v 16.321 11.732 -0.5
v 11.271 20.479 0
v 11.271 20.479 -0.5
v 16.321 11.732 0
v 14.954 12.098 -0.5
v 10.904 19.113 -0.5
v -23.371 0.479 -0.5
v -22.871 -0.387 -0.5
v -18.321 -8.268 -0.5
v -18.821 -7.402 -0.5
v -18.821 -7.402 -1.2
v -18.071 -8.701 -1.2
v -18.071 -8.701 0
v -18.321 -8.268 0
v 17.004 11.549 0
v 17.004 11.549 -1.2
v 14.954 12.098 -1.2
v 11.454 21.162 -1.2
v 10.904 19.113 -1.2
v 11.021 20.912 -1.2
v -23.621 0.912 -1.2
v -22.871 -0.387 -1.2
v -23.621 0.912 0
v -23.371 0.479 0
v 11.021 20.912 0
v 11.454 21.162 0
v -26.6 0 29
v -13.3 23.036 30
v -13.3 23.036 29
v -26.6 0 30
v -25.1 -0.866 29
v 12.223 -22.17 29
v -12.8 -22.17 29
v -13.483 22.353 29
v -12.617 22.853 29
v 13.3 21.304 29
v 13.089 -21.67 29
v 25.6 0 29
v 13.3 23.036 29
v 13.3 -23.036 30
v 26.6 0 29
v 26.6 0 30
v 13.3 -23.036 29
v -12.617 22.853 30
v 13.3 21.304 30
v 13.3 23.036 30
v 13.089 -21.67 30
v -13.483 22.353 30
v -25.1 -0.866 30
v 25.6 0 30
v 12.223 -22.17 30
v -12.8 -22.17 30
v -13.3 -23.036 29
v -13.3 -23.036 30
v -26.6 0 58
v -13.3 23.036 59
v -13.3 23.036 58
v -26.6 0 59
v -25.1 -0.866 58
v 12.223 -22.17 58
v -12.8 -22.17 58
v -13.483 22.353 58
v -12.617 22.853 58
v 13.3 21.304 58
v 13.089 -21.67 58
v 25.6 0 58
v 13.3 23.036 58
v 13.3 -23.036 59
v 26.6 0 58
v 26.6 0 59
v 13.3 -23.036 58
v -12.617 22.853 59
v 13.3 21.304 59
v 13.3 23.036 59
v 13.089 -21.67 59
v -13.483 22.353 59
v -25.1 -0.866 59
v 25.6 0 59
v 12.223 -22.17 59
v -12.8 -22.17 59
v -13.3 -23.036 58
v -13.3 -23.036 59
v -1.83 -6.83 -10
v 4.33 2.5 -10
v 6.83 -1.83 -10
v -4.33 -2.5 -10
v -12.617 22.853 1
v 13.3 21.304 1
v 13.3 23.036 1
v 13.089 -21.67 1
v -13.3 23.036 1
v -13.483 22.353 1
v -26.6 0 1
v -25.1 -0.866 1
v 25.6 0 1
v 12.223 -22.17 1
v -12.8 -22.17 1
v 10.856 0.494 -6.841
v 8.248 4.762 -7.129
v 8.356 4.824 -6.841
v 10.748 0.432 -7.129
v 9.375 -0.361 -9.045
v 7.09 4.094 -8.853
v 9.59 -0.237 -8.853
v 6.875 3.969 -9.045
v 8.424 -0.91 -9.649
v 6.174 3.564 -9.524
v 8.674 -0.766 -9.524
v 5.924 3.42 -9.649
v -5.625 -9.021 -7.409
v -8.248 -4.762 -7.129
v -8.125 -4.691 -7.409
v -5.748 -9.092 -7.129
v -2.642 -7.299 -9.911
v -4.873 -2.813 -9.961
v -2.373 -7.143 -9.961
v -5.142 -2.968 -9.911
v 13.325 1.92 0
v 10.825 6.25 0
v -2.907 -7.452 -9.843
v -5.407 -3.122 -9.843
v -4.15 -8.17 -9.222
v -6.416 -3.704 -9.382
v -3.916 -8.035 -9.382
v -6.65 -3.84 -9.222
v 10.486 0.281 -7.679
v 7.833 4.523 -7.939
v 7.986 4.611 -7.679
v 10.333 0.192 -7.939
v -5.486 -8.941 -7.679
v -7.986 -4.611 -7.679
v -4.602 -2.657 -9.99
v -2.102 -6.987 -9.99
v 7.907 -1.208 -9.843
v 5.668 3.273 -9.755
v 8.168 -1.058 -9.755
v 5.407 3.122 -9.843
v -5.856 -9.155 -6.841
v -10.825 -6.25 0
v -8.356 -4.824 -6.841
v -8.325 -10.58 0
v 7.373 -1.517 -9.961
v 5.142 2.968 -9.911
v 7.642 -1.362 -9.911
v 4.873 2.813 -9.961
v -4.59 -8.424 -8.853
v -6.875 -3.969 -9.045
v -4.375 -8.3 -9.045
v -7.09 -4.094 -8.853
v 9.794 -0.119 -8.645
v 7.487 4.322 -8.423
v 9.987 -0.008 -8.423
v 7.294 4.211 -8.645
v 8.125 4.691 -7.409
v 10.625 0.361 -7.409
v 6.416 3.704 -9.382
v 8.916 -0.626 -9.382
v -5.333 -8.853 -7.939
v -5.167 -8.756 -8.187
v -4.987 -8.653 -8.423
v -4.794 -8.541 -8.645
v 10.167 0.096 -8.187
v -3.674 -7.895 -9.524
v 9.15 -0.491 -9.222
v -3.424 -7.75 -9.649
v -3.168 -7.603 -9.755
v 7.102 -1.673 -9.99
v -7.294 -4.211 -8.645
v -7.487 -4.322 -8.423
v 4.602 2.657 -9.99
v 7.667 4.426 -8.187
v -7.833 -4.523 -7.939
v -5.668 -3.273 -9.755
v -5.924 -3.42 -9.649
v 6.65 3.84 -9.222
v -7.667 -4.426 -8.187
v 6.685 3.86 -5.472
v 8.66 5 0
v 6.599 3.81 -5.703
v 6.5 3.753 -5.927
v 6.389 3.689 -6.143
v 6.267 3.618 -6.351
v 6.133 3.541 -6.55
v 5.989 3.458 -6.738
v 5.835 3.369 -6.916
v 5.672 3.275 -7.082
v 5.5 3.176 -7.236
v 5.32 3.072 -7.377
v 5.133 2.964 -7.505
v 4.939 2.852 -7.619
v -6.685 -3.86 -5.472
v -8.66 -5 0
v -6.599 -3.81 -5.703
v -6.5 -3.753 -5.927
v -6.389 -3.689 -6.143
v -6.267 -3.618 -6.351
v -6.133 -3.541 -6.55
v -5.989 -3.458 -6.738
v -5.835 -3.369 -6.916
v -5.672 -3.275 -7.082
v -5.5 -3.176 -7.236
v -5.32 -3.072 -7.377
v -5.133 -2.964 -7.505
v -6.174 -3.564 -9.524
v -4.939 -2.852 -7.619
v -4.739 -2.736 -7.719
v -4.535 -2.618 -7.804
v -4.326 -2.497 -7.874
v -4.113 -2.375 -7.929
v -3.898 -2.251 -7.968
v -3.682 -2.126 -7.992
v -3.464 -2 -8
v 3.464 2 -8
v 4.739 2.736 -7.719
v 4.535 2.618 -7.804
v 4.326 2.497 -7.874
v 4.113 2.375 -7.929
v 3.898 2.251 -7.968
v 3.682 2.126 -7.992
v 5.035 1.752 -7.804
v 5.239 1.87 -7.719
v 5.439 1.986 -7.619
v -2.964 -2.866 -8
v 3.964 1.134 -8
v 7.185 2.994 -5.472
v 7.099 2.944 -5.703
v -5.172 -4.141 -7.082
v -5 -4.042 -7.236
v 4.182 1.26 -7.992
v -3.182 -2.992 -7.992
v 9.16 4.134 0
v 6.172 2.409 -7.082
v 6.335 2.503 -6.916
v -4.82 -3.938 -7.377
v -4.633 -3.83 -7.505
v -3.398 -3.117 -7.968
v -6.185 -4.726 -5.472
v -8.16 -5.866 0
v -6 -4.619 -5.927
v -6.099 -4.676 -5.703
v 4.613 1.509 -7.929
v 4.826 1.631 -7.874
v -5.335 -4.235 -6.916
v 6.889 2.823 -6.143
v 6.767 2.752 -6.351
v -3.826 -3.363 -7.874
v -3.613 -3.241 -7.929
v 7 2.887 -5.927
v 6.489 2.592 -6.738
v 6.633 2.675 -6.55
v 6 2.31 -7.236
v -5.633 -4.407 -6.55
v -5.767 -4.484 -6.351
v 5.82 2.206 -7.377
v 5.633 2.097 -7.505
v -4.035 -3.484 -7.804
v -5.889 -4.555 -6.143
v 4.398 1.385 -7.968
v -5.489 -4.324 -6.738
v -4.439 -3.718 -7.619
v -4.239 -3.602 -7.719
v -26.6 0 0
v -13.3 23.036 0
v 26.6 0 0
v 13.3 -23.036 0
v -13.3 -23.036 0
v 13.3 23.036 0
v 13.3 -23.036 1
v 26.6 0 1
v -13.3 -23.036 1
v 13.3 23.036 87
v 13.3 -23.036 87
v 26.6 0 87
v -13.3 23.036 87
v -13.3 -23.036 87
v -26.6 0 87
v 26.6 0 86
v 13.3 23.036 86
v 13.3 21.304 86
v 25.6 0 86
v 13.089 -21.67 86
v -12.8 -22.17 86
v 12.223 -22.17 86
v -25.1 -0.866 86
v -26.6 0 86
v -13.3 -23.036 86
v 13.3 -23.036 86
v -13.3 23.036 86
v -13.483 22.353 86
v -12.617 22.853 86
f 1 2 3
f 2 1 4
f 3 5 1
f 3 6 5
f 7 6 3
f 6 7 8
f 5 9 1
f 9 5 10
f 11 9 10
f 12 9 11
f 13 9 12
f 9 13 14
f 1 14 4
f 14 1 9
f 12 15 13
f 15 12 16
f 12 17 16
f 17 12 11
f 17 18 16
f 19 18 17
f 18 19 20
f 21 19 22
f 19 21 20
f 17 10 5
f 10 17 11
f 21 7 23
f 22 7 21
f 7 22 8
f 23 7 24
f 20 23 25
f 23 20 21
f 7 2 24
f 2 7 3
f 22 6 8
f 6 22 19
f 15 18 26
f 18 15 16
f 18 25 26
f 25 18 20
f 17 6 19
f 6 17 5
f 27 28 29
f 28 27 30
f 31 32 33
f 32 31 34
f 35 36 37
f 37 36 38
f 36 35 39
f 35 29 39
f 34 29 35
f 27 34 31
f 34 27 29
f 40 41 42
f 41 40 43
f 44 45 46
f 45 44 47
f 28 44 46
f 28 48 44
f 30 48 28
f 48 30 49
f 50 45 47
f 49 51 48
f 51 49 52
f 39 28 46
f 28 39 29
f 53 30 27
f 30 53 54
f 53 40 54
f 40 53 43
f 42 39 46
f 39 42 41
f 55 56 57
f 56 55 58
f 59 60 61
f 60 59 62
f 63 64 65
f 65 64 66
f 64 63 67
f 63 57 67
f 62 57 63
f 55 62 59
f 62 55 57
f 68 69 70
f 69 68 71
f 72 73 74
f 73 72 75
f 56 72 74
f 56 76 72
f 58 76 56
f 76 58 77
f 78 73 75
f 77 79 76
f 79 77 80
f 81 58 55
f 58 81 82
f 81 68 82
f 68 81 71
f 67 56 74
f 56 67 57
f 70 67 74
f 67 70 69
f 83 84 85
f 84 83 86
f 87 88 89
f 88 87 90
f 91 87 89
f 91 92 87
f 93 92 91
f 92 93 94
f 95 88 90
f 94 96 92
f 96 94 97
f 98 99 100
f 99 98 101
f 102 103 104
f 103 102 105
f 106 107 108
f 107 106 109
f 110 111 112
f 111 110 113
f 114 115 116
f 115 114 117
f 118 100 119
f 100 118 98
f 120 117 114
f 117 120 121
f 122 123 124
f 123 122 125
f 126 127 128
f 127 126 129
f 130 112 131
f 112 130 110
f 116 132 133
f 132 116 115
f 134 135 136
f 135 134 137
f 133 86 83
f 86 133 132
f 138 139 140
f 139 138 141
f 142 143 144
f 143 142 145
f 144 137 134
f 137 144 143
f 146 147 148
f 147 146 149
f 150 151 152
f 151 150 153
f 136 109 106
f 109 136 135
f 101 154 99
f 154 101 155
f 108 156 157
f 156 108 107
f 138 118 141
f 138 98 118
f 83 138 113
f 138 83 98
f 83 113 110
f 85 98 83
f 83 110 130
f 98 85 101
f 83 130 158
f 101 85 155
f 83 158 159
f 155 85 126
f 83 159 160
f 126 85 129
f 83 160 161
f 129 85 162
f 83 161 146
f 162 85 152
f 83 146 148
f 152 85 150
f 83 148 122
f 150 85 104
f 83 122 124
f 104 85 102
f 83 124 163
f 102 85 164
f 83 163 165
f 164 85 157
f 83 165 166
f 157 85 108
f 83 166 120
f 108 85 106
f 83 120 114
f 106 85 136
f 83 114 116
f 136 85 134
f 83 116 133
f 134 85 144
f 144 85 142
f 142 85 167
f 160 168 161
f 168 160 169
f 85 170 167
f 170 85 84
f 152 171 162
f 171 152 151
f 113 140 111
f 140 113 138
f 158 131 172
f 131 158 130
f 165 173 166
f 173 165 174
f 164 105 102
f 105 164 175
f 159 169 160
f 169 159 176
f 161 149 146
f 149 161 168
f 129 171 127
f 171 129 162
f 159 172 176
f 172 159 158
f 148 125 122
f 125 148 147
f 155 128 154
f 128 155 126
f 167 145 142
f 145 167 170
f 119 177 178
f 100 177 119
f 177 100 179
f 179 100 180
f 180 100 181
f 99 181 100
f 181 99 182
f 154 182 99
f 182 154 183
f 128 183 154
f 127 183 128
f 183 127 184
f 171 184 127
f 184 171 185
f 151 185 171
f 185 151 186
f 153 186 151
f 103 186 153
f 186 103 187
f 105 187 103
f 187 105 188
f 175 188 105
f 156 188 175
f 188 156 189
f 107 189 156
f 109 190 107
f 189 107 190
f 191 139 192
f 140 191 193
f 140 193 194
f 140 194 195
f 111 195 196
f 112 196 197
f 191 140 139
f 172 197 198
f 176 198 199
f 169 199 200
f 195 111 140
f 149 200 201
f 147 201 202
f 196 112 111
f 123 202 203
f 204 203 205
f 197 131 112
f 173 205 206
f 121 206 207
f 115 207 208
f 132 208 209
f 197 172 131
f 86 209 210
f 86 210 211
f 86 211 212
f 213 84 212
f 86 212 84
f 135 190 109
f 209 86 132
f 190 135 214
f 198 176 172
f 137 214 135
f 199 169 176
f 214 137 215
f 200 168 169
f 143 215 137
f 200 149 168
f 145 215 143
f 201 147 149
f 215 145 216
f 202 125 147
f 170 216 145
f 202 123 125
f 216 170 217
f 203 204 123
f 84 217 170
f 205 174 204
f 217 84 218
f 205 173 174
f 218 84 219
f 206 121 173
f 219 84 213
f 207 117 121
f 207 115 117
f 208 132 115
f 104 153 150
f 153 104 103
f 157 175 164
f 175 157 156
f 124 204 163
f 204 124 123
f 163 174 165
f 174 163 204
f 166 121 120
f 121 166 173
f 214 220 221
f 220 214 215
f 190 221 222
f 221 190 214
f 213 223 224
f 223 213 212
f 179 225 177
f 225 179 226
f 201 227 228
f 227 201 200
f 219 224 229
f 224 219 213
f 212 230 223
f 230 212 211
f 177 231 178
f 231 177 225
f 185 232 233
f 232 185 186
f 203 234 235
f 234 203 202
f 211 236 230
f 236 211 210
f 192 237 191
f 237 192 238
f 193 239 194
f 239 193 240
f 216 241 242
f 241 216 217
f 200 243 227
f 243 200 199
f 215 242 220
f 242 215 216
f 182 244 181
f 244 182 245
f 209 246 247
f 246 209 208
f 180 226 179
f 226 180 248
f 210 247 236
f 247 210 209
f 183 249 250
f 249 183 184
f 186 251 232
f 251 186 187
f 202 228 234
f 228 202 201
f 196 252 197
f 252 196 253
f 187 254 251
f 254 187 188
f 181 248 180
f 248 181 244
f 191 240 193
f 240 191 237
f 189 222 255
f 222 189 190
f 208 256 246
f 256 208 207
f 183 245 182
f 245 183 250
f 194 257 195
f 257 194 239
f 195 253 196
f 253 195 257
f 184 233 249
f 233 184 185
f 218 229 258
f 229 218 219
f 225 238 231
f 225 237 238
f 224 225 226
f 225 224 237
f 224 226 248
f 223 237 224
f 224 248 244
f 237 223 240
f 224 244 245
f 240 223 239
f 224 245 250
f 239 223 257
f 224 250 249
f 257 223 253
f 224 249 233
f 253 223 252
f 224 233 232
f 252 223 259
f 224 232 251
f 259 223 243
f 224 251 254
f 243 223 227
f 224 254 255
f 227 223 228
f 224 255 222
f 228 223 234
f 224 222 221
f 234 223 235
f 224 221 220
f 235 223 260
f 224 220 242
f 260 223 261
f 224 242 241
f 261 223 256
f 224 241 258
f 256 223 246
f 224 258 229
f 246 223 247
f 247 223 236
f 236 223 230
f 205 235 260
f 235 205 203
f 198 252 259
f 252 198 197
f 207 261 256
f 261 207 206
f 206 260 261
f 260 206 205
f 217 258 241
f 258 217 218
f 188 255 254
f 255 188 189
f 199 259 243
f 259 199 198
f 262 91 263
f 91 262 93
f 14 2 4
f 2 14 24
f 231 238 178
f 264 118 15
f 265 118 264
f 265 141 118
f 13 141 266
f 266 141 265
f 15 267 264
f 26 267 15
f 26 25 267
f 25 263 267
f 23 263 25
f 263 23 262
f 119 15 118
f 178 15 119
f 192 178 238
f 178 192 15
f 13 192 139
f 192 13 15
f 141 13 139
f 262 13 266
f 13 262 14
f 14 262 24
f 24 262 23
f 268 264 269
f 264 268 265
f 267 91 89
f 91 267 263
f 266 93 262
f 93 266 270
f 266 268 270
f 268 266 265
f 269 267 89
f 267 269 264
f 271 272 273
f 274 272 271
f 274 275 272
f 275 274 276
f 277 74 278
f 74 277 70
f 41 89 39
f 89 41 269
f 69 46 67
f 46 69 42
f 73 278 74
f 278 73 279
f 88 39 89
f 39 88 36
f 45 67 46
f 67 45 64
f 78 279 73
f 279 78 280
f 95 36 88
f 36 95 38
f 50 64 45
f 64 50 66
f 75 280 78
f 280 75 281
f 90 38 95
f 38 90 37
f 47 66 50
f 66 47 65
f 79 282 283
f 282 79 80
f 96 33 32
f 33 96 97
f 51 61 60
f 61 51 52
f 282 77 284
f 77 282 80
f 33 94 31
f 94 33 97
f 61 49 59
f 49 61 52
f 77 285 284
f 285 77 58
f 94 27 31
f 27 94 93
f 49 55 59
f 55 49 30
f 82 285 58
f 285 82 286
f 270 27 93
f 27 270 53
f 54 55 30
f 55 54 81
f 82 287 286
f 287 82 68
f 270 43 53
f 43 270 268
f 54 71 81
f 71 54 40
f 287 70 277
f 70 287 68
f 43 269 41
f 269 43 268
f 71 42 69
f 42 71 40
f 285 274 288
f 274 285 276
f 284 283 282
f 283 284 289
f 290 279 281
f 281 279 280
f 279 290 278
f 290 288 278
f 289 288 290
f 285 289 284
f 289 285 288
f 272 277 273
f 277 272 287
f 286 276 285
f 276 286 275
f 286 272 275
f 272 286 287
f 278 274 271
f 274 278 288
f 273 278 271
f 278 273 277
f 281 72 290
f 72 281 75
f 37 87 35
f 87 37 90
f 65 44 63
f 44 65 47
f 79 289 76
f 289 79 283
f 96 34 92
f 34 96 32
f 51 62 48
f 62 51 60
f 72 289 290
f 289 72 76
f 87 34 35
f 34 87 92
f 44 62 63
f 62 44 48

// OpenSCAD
// file: label.scad
$fn=100;
text="M3 Schrauben";
font="Liberation Sans:style=Bold";
depth=0.5;
height=10;
width=40;
fontsize=3.8;

label();
module label() {
    translate([-width/2, 0, 0]) cube([width, height, depth]);
    color("#7F7F7FFF") translate([0,(height-fontsize)/2,depth]) 
    linear_extrude(0.5) 
    text(text, size=fontsize, halign="center",font=font);
}

function getLabelHeight() = height;
function getLabelLength() = width;
function getLabelDepth() = depth;
// main file
use<label.scad>

diameter=53.2;
_flatSideDiam = (diameter / 2) * sqrt(3 / 4);

thickness = 2;
height= 87;

// config
seperators = 2;
middlesep=true;
bitHolder=false;
labelMount=true;


size=1;

if(size == 1) {
    linear_extrude(1) circle(d=diameter, $fn=6);

    if(labelMount) {
        rotate([0, 0, 30]) translate([-getLabelLength()/2, 2, -getLabelDepth()]) {
            #translate([0, -0.5, 0]) {
                cube([getLabelLength(), 0.5, getLabelDepth() + 0.2]);
                translate([0,0,-(getLabelDepth() + 0.2)]) cube([getLabelLength(), 1.5, getLabelDepth() + 0.2]);
            }
            
            #translate([0, getLabelHeight() + 0.1, 0]) {
                cube([getLabelLength(), 0.5, getLabelDepth() + 0.2]);
                translate([0,-1,-(getLabelDepth() + 0.2)]) cube([getLabelLength(), 1.5, getLabelDepth() + 0.2]);
            }
            
            labelHeightOffset = 1 + 0.1;
            #translate([getLabelLength(), -0.5, 0]) {
                cube([0.5, getLabelHeight() + labelHeightOffset, getLabelDepth() + 0.2]);
                translate([-1,0,-(getLabelDepth() + 0.2)]) cube([1.5, getLabelHeight()+labelHeightOffset, getLabelDepth() + 0.2]);
            }
        }
    }

    
    //#rotate([0, 0, 30]) translate([0, 2, 0.5]) rotate([0, 180, 0])mountholes();
    
    linear_extrude(height) basehex();
    translate([0,0, height-1]) linear_extrude(1) circle(d=diameter, $fn=6);
    
    if(bitHolder) {
        rotate([0,0,30]) difference() {
            translate([-22, -12, 0]) cube([44, 15, height]);
            for (z =[9:13:height-5]) {
                xstep = 8;
                for (x = [0:xstep:(_flatSideDiam*2) - 10]) {
                    shift = (x % (xstep*2)) == 0 ? 6.5 : 0;
                    #translate([x + 7.5 - _flatSideDiam,-9, z + shift]) rotate([0, 90, 90]) rotate([0, 0, 30]) cylinder(h=12, d=(6.85 / sqrt(3/4)), $fn=6);
                }
                
            }
            
        }
    }


    // add seperators
    if(seperators > 0) {
        step = height/(seperators+1);
        
        for(i = [step:step:height-step]){
            translate([0,0, i]) linear_extrude(1) circle(d=diameter, $fn=6);
        } 
    }

    if(middlesep) {
        translate([0, 0, height/2]) rotate([0,0,120]) cube([diameter-1,1,height - 2], center=true);
    }

    // add knob
    translate([0,0,-5]) rotate([90, 0, 30]) difference() {
        linear_extrude(5) knobbody();
        linear_extrude(1) translate([0,1,0])  scale([.8,.8,1]) knobbody();
    };
} else {
    linear_extrude(1) rotate([0,0,30]) circle(d=diameter, $fn=6);
    translate([0,0, height-1]) linear_extrude(1) rotate([0,0,30]) circle(d=diameter, $fn=6);
    
    linear_extrude(1) translate([-diameter+1, 0, 0]) rotate([0,0,30]) circle(d=diameter, $fn=6);
    translate([0,0, height-1]) linear_extrude(1) translate([-diameter+1, 0, 0]) rotate([0,0,30]) circle(d=diameter, $fn=6);
    linear_extrude(height) basehex2();
    
    translate([(-diameter/2)+ 0.5, 0, 0.5]) cube([6.5, 26.5, 1], center=true);
    translate([(-diameter/2)+ 0.5, 0, height -0.5]) cube([6.5, 26.5, 1], center=true);
    
    //#translate([(-diameter/2)+ 0.5, -13, height/2]) cube([8, 1, height], center=true);
    
    # linear_extrude(height) translate([-diameter/2 + 0.5, -13.4, 0])  polygon([[-5,0],[5,0], [3,1], [-3,1]]);
    
    translate([-diameter/2,0,-5]) rotate([90, 0, 0]) difference() {
        linear_extrude(5) rotate([0,0,0]) knobbody(w=40, d=12.5);
        linear_extrude(1) translate([0,1,0])  scale([.8,.8,1]) knobbody(w=40, d=12.5);
    };
}

module basehex2() {
    rotate([0,0,30]) difference() {
        circle(d=diameter, $fn=6);
        circle(d=diameter - thickness, $fn=6);
        translate([0,3 + _flatSideDiam - thickness,0]) square([diameter/2,6], center=true);
        rotate([0,0,-60]) translate([0,3 + _flatSideDiam - thickness,0]) square([diameter/2,6], center=true);
        rotate([0,0,60]) translate([0,3 + _flatSideDiam - thickness,0]) square([diameter/2,6], center=true);
    }
    
    translate([-diameter+1, 0, 0]) rotate([0,0,30]) difference() {
        circle(d=diameter, $fn=6);
        circle(d=diameter - thickness, $fn=6);
        translate([0,3 + _flatSideDiam - thickness,0]) square([diameter/2,6], center=true);
        rotate([0,0,-60]) translate([0,3 + _flatSideDiam - thickness,0]) square([diameter/2,6], center=true);
        rotate([0,0,-120]) translate([0,3 + _flatSideDiam - thickness,0]) square([diameter/2,6], center=true);
    }
}

module basehex() {
    difference() {
        circle(d=diameter, $fn=6);
        circle(d=diameter - thickness, $fn=6);
        #translate([0,3 + _flatSideDiam - thickness,0]) square([diameter/2,6], center=true);
        #rotate([0,0,60]) translate([0,3 + _flatSideDiam - thickness,0]) square([diameter/2,6], center=true);
    }
}

module knobbody(w=25, d=5) {
    hull() {
        #translate([-d,0,0]) circle(5, $fn=100);
        #translate([d,0,0]) circle(5, $fn=100);
        #translate([-w/2,5,0]) square([w, 1]);
    }
}


//polygon([[0,0], [1,0], [1,1]]);
